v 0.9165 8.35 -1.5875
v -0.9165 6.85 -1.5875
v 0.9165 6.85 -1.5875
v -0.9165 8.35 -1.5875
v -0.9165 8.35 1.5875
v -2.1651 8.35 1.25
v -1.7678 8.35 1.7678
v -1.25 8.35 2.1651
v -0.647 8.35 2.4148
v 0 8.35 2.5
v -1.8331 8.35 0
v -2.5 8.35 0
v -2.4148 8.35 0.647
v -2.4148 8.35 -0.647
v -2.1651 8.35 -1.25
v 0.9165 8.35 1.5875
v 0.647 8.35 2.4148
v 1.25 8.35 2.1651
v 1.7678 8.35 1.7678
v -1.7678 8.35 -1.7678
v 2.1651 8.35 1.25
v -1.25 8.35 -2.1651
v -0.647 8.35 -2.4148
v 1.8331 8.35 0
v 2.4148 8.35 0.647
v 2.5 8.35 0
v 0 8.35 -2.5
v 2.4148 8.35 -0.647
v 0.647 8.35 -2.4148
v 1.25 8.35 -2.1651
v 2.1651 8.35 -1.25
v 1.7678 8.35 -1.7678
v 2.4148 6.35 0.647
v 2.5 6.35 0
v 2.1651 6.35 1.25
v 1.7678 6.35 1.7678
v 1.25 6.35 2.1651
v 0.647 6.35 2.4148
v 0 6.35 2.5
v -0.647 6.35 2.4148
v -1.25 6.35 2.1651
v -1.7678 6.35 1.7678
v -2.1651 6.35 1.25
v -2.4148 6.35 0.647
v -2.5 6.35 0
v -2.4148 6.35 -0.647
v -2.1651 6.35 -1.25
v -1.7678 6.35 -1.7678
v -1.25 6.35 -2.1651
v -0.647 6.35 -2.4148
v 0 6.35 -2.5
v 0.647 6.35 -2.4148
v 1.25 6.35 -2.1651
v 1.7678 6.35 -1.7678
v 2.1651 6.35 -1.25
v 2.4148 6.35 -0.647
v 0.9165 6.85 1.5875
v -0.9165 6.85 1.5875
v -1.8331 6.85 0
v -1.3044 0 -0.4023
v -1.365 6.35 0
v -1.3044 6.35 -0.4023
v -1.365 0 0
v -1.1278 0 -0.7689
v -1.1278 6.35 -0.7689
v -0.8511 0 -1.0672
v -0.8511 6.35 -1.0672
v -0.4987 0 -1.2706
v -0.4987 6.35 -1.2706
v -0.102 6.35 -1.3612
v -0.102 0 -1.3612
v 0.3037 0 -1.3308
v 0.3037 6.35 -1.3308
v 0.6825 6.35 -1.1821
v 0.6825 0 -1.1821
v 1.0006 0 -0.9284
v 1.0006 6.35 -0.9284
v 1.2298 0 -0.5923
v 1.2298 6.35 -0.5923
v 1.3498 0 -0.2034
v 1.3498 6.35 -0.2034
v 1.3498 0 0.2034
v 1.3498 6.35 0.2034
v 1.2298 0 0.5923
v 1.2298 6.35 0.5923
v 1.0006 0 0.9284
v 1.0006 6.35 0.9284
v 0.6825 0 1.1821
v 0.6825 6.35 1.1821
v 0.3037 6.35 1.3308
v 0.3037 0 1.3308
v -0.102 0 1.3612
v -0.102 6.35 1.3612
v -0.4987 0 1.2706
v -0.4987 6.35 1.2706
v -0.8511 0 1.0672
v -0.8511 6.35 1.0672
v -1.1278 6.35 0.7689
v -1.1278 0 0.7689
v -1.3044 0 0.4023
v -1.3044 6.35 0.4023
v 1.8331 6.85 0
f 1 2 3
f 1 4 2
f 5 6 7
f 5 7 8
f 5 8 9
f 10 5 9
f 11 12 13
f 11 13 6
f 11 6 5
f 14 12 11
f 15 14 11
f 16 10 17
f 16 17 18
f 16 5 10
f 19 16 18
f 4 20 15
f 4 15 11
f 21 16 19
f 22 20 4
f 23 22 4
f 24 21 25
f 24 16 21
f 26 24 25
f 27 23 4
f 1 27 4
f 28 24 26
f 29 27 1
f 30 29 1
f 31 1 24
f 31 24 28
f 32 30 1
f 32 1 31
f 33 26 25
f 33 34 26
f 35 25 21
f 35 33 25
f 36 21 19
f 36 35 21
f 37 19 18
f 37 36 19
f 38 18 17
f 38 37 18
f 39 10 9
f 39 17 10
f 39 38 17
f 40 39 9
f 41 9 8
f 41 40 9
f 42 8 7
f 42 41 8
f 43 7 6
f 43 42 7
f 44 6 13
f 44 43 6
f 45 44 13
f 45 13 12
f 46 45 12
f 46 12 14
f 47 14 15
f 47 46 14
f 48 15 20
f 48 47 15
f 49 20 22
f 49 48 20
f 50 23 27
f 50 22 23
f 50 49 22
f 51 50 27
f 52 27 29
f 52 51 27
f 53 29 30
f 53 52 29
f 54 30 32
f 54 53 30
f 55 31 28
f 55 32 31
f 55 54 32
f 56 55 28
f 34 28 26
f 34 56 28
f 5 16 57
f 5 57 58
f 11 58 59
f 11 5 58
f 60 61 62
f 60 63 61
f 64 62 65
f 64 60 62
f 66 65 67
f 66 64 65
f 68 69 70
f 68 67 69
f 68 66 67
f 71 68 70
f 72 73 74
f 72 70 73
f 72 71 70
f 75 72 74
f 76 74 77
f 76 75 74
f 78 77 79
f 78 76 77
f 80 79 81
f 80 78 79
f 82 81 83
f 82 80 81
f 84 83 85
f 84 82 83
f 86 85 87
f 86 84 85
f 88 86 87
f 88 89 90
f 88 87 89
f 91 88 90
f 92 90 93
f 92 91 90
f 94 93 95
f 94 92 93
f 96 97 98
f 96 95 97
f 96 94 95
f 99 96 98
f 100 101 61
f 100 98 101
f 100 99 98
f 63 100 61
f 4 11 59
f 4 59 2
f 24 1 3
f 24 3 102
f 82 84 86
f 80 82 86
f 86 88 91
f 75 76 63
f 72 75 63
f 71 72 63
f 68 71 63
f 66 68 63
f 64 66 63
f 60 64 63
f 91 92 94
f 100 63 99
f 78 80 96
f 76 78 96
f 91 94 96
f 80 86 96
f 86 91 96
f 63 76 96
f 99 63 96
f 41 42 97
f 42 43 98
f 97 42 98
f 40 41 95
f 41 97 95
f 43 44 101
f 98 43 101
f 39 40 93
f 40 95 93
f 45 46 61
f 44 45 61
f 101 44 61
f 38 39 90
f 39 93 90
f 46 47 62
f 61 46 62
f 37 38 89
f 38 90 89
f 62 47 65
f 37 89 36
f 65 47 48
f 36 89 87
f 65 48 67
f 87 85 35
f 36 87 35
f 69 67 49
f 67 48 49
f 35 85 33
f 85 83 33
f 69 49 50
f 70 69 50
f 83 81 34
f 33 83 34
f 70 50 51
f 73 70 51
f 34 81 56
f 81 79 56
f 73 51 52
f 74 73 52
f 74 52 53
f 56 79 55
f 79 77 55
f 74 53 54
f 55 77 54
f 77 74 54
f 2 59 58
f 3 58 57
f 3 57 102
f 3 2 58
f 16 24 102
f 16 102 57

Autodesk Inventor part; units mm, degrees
ref_plane "YZ Plane" through (0, 0, 0) normal (1, 0, 0) x (0, 1, 0)
ref_plane "XZ Plane" through (0, 0, 0) normal (0, 1, 0) x (-1, 0, 0)
ref_plane "XY Plane" through (0, 0, 0) normal (0, 0, 1) x (1, 0, 0)
sketch "Sketch1" plane through (0, 0, 0) normal (0, 1, 0) x (-1, 0, 0)
  circle A0 centre (0, 0) radius 1.365
  dimension "d0" = 2.73
extrude "Extrusion1" add sketch "Sketch1" along normal blind 6.35
sketch "Sketch2" plane through (0, 6.35, 0) normal (0, 1, 0) x (1, 0, 0)
  circle A0 centre (0, 0) radius 2.5
  dimension "d3" = 5
extrude "Extrusion2" add sketch "Sketch2" along normal blind 2
sketch "Sketch3" plane through (0, 8.35, 0) normal (0, 1, 0) x (1, 0, 0)
  circle A0 centre (0, 0) radius 1.365 projected
  line L0 (-1.8331, 0) -> (-0.9165, 1.5875)
  line L1 (-0.9165, 1.5875) -> (0.9165, 1.5875)
  line L2 (0.9165, 1.5875) -> (1.8331, 0)
  line L3 (1.8331, 0) -> (0.9165, -1.5875)
  line L4 (0.9165, -1.5875) -> (-0.9165, -1.5875)
  line L5 (-0.9165, -1.5875) -> (-1.8331, 0)
  dimension "d6" = 3.175
extrude "Extrusion3" cut sketch "Sketch3" against normal blind 1.5 contours A0 | L0 L1 L2 L3 L4 L5
thread "Thread1" size "4-40 UNC" class "2A" standard "ANSI Unified Screw Threads" full length
properties part number "Electronics Mounting bolt" material "Steel, Galvanized"
